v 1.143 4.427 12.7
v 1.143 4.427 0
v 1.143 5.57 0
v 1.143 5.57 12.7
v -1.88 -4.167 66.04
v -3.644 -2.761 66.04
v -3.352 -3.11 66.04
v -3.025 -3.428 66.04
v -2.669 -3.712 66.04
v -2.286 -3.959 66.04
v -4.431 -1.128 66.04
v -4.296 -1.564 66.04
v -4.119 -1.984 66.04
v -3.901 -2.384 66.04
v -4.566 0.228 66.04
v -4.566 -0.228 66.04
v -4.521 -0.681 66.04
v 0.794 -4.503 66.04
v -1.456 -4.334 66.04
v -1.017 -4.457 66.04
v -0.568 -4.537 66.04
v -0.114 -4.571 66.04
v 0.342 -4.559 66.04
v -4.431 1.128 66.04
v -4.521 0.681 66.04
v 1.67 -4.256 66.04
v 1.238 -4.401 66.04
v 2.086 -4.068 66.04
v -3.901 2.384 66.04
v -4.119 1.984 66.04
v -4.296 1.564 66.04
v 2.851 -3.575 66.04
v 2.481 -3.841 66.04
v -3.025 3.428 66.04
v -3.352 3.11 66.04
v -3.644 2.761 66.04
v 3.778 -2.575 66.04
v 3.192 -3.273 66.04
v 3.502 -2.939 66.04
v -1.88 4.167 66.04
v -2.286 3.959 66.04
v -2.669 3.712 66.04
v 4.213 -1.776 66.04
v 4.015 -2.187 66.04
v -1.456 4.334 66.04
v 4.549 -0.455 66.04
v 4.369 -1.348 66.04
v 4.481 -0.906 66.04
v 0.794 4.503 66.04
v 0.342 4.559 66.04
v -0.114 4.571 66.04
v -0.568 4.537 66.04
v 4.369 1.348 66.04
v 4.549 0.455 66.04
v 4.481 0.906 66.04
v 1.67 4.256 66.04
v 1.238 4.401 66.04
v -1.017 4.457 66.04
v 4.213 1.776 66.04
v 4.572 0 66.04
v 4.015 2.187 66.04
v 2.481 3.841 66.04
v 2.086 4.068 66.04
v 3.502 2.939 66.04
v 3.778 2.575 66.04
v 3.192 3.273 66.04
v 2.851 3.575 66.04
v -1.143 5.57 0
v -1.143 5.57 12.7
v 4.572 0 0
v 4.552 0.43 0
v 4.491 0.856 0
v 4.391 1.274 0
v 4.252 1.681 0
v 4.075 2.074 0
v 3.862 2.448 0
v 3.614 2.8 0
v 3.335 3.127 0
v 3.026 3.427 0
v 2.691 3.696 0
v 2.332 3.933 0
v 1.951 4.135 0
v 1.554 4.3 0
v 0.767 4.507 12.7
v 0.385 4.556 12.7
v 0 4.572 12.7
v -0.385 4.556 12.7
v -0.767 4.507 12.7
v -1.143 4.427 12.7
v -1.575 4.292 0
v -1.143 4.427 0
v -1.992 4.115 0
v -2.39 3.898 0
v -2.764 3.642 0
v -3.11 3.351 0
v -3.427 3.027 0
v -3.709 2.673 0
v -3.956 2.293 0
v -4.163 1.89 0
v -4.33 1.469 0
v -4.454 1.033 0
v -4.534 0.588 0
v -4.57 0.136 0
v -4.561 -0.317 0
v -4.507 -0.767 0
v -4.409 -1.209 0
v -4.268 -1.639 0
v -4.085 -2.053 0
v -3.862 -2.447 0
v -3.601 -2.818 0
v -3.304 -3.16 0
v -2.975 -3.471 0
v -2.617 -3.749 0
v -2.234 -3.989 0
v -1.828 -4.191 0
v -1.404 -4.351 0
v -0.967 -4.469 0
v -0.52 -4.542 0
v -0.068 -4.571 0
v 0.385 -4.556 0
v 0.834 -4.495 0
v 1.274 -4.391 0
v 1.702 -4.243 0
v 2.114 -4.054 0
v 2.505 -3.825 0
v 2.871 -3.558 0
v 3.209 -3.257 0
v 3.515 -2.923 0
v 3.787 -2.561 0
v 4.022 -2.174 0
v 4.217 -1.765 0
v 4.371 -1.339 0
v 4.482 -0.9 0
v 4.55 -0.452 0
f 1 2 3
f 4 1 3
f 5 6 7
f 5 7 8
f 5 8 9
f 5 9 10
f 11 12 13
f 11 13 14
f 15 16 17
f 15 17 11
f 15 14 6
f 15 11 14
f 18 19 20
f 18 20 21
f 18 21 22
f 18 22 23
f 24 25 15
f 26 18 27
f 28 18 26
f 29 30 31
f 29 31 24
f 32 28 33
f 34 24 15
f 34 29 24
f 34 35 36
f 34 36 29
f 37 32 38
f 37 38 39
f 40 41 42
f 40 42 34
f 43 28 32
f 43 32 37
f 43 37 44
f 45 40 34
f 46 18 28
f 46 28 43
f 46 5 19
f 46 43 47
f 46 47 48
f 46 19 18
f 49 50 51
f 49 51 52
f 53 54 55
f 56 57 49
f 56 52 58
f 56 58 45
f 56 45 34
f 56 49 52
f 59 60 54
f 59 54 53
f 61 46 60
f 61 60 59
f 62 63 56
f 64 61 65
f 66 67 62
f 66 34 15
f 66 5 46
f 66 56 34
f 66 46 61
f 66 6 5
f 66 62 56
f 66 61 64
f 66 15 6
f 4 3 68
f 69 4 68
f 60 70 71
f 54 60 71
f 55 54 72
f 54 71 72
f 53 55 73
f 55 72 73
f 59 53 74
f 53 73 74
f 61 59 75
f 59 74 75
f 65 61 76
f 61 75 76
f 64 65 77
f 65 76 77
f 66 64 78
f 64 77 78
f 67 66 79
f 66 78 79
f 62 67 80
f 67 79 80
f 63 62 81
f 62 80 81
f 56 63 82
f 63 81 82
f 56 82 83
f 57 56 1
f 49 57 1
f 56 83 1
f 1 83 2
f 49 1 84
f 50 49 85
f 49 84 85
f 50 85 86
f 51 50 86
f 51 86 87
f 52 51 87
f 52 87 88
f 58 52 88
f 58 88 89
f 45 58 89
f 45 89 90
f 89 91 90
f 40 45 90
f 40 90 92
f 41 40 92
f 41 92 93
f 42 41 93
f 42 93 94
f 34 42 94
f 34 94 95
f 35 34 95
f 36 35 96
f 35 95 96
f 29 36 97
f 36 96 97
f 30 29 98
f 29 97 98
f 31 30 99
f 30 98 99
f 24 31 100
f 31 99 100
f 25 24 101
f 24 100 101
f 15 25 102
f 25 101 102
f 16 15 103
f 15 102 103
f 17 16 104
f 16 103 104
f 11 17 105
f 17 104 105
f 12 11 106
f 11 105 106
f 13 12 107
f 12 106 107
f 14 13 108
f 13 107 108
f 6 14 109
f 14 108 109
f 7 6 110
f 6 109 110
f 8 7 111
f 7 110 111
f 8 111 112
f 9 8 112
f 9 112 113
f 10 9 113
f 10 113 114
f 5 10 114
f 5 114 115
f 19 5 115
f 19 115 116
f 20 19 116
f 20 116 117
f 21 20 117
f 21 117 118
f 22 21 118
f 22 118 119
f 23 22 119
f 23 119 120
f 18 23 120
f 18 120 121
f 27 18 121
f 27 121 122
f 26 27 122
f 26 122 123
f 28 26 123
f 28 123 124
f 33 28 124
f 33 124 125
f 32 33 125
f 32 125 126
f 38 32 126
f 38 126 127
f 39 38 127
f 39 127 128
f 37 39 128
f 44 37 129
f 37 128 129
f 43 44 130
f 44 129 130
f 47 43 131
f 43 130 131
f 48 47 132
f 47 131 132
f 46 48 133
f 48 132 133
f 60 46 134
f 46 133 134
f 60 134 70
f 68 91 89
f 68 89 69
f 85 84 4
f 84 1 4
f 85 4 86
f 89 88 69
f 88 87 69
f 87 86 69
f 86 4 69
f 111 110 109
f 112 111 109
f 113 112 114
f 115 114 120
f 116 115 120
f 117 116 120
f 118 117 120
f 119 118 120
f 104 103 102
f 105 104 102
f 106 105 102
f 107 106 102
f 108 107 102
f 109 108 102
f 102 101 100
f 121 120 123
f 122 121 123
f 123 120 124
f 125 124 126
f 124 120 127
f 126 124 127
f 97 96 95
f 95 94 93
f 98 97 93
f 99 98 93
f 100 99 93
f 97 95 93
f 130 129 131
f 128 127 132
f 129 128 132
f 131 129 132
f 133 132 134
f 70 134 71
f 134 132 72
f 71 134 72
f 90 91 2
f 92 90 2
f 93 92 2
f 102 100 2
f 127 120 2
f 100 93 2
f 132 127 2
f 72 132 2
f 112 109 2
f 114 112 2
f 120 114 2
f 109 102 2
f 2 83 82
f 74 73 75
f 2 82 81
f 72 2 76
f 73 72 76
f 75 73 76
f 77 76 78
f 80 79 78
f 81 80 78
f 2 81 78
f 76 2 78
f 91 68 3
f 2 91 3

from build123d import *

# Parameters (mm, degrees)
SKETCH1_R           = 4.572
BOSS_EXTRUDE1_DEPTH = 66.04
SKETCH3_W           = 2.286
SKETCH3_H           = 2.286
BOSS_EXTRUDE3_DEPTH = 12.7


with BuildPart() as part:
    # Sketch1 → Boss-Extrude1 (new body)
    with BuildSketch(Plane.XY):
        Circle(SKETCH1_R)
    extrude(amount=BOSS_EXTRUDE1_DEPTH)

    # Sketch3 → Boss-Extrude3 (add)
    with BuildSketch(Plane(origin=(0, 0, 0), x_dir=(-1, 0, 0), z_dir=(0, 0, -1))):
        with Locations((0, 4.426819965)):
            Rectangle(SKETCH3_W, SKETCH3_H)
    extrude(amount=-BOSS_EXTRUDE3_DEPTH)


solid = part.part
